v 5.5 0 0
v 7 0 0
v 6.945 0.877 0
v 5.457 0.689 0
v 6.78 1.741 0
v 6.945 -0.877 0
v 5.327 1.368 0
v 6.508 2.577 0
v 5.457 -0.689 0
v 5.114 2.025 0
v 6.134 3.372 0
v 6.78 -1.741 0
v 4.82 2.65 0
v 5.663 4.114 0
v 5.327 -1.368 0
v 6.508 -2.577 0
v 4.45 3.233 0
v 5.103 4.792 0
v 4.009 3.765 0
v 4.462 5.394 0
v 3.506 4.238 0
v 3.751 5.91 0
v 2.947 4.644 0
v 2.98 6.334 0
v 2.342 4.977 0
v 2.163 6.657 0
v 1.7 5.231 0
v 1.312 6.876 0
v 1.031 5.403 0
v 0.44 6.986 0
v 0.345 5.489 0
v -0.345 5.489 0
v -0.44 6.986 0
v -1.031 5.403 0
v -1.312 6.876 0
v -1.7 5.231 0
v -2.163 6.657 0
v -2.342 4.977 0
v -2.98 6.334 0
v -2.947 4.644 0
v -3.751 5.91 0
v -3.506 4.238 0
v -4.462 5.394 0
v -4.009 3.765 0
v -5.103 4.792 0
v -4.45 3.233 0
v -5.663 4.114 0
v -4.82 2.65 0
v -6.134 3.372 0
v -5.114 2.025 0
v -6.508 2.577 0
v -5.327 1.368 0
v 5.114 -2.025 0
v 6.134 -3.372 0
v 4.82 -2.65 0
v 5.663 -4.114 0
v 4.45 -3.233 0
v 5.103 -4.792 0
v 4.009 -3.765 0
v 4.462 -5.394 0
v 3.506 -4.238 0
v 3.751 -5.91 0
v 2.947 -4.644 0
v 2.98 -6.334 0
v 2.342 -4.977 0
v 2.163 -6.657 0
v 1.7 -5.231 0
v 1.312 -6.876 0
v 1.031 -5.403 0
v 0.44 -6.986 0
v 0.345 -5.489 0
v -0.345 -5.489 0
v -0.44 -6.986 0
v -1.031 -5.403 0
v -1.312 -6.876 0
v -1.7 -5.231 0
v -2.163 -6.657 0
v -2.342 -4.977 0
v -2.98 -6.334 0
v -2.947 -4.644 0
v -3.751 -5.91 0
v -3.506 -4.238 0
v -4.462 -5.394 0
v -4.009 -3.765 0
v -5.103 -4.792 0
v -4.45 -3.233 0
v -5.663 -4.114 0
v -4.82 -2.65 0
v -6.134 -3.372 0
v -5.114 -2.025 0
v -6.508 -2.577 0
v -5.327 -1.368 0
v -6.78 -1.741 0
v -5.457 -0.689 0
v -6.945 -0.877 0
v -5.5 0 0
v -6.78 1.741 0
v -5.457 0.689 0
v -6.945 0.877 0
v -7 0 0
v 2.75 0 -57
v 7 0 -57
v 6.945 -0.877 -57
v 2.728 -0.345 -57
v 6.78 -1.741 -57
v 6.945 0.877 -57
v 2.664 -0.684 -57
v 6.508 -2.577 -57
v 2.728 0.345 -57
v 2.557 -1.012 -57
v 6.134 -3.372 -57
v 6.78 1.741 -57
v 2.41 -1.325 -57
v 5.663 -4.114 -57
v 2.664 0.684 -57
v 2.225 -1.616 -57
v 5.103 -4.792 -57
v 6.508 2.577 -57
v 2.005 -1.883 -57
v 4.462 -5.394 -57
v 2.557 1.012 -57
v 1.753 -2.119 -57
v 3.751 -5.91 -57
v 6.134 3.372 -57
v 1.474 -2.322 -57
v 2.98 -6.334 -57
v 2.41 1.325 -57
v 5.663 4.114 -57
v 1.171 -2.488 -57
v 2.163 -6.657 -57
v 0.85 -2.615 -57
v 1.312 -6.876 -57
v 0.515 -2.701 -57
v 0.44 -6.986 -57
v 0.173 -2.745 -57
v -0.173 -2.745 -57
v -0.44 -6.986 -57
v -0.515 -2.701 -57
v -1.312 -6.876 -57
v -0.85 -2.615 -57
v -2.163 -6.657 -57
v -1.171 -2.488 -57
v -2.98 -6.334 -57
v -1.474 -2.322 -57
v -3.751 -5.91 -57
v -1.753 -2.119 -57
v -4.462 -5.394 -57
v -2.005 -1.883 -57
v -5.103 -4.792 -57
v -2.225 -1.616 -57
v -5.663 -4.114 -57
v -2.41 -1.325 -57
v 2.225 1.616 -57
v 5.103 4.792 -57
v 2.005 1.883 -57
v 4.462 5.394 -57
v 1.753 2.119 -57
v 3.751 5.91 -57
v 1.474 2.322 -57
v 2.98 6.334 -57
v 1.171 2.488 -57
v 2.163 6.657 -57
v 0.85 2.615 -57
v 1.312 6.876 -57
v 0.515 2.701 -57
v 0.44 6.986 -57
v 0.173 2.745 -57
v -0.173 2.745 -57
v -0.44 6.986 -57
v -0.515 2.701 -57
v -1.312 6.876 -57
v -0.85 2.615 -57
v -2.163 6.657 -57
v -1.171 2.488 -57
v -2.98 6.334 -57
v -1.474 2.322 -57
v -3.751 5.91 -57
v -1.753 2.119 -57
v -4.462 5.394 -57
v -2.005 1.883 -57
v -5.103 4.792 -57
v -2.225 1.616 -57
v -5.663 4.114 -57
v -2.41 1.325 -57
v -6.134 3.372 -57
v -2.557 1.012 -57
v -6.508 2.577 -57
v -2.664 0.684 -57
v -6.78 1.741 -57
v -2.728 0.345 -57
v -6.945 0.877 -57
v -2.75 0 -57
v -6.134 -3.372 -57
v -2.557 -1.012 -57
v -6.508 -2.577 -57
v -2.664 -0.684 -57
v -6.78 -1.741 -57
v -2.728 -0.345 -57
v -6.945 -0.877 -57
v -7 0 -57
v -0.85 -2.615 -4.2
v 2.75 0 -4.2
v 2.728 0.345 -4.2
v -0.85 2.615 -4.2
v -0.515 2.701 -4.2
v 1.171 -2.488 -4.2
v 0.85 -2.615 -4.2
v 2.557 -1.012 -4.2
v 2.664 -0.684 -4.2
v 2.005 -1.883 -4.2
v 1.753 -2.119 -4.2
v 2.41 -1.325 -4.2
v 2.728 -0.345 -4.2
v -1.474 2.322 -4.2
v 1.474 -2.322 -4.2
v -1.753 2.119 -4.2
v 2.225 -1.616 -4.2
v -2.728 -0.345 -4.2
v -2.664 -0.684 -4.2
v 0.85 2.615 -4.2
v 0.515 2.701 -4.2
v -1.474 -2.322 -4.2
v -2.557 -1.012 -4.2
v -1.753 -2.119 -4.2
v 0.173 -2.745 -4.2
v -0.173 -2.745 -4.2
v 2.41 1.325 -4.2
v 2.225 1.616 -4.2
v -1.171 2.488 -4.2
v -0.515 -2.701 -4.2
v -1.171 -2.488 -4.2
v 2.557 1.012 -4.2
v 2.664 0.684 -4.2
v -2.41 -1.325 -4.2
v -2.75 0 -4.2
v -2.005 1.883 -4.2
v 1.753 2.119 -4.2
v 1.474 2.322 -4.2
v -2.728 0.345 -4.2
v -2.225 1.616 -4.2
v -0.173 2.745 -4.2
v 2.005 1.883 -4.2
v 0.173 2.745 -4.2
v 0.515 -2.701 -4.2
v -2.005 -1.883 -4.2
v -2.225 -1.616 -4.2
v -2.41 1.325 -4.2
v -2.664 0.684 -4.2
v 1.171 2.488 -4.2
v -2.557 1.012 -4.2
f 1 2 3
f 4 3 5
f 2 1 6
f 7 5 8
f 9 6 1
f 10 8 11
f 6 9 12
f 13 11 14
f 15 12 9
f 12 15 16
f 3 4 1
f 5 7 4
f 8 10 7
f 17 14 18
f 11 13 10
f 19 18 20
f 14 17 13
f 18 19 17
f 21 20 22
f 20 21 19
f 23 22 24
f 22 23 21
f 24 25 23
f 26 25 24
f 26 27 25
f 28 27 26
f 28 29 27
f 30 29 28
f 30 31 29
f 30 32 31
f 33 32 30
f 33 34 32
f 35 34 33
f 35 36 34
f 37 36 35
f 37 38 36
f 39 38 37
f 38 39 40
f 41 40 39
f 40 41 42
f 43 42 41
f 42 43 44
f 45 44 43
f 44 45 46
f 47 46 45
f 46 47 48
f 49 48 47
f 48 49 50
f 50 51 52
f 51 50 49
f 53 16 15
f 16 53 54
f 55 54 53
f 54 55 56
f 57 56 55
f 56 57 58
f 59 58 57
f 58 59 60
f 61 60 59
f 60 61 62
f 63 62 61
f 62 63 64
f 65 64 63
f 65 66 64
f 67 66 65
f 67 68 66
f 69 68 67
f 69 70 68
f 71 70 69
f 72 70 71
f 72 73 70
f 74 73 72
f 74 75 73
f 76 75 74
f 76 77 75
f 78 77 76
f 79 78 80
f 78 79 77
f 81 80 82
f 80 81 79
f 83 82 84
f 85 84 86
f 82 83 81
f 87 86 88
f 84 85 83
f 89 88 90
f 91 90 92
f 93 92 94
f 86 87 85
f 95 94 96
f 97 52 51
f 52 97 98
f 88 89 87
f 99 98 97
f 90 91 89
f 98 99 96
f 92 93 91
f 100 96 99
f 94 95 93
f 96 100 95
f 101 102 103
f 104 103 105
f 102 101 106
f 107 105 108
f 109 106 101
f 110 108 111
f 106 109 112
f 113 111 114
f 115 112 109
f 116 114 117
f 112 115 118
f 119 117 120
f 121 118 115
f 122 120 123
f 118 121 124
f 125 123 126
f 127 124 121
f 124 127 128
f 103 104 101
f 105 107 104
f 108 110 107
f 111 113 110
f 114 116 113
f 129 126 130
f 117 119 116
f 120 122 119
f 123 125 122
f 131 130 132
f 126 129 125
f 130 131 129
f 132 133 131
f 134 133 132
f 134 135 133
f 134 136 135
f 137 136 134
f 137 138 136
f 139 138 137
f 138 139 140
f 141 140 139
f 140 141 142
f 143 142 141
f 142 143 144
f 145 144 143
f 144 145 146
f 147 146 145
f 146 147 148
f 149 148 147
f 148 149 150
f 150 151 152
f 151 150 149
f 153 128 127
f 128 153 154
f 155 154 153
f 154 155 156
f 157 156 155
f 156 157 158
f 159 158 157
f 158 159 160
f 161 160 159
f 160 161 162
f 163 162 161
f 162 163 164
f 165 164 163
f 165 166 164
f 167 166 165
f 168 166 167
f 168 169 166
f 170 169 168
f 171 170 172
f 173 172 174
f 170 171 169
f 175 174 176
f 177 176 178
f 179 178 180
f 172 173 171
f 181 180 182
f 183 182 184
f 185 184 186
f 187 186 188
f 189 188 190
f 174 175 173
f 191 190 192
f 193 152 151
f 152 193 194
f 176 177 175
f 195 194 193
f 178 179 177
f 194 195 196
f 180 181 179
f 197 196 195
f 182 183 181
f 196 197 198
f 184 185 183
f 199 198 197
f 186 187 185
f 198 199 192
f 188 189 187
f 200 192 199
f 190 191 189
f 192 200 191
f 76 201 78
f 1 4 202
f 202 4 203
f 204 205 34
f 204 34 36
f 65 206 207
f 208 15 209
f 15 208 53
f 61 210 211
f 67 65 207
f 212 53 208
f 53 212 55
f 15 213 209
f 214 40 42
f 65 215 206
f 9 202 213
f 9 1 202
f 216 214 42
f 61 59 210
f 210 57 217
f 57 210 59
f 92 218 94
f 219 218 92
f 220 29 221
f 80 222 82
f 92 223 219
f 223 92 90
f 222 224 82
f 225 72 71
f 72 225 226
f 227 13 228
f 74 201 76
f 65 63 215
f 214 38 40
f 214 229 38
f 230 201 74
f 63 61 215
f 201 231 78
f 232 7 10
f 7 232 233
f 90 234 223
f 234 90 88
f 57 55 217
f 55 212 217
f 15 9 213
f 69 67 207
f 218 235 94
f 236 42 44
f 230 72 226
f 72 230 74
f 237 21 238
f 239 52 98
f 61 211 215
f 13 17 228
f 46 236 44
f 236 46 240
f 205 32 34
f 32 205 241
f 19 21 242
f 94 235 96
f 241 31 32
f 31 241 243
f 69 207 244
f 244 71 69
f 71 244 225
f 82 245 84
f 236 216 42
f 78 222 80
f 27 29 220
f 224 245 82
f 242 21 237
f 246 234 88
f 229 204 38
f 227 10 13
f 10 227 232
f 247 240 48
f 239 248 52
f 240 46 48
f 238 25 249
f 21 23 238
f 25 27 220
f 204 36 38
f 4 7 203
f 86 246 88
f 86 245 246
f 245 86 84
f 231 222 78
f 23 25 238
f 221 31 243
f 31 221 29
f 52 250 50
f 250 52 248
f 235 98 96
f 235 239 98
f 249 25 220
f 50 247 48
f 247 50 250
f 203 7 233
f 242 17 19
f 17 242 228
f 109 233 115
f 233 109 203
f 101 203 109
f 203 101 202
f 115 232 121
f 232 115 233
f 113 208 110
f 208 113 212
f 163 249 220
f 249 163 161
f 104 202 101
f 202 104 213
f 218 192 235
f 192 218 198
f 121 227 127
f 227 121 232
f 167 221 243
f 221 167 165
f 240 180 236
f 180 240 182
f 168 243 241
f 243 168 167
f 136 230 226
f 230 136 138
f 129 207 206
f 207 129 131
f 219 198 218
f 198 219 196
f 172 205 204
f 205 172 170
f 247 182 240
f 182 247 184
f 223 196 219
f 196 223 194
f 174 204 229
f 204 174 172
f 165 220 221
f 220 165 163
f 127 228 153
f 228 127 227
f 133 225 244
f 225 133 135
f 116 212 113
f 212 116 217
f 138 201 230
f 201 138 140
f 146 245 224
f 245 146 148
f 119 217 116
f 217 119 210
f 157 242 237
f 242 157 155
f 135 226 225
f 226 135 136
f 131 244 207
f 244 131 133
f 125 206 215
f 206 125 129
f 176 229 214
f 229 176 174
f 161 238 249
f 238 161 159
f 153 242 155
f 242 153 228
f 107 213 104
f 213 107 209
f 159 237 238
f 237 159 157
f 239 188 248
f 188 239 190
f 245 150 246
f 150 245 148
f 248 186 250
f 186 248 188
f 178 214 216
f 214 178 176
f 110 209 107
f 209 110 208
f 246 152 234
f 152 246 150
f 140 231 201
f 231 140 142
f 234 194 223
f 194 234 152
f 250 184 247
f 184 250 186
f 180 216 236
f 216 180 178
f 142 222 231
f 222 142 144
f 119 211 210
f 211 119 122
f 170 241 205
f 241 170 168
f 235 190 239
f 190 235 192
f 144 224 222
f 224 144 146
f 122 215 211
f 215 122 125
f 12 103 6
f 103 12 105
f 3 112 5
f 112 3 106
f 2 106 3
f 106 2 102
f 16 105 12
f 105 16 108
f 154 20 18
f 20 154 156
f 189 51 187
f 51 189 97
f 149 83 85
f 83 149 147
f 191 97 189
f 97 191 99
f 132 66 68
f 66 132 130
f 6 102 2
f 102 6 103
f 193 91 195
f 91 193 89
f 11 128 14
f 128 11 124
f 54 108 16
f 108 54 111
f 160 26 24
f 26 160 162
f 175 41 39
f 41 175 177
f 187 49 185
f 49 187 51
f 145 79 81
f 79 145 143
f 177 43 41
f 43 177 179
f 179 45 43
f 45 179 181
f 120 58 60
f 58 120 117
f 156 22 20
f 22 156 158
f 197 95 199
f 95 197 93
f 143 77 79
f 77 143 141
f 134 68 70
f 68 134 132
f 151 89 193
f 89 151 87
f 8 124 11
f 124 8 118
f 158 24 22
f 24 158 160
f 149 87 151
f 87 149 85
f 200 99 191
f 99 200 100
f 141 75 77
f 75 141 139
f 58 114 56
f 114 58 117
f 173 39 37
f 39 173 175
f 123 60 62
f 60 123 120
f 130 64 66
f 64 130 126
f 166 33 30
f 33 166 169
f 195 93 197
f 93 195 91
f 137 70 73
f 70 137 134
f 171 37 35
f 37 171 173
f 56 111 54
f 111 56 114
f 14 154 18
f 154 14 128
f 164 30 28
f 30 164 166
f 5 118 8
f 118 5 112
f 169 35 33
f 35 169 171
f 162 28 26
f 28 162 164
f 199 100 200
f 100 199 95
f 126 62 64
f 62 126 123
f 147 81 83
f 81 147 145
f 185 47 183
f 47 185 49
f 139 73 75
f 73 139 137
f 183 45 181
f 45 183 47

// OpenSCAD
$fn = 50;


difference() {
	union() {
		translate(v = [0, 0, -57.0000000000]) {
			cylinder(h = 57, r = 7.0000000000);
		}
		cylinder(h = 0, r = 13.0000000000);
	}
	union() {
		translate(v = [0, 0, 0]) {
			rotate(a = [0, 0, 0]) {
				difference() {
					union() {
						#translate(v = [0, 0, -57.0000000000]) {
							cylinder(h = 57, r = 2.2500000000);
						}
						#translate(v = [0, 0, -4.2000000000]) {
							cylinder(h = 4.2000000000, r1 = 2.7500000000, r2 = 5.5000000000);
						}
						#translate(v = [0, 0, -57.0000000000]) {
							cylinder(h = 57, r = 2.7500000000);
						}
						#translate(v = [0, 0, -57.0000000000]) {
							cylinder(h = 57, r = 2.2500000000);
						}
					}
					union();
				}
			}
		}
	}
}
